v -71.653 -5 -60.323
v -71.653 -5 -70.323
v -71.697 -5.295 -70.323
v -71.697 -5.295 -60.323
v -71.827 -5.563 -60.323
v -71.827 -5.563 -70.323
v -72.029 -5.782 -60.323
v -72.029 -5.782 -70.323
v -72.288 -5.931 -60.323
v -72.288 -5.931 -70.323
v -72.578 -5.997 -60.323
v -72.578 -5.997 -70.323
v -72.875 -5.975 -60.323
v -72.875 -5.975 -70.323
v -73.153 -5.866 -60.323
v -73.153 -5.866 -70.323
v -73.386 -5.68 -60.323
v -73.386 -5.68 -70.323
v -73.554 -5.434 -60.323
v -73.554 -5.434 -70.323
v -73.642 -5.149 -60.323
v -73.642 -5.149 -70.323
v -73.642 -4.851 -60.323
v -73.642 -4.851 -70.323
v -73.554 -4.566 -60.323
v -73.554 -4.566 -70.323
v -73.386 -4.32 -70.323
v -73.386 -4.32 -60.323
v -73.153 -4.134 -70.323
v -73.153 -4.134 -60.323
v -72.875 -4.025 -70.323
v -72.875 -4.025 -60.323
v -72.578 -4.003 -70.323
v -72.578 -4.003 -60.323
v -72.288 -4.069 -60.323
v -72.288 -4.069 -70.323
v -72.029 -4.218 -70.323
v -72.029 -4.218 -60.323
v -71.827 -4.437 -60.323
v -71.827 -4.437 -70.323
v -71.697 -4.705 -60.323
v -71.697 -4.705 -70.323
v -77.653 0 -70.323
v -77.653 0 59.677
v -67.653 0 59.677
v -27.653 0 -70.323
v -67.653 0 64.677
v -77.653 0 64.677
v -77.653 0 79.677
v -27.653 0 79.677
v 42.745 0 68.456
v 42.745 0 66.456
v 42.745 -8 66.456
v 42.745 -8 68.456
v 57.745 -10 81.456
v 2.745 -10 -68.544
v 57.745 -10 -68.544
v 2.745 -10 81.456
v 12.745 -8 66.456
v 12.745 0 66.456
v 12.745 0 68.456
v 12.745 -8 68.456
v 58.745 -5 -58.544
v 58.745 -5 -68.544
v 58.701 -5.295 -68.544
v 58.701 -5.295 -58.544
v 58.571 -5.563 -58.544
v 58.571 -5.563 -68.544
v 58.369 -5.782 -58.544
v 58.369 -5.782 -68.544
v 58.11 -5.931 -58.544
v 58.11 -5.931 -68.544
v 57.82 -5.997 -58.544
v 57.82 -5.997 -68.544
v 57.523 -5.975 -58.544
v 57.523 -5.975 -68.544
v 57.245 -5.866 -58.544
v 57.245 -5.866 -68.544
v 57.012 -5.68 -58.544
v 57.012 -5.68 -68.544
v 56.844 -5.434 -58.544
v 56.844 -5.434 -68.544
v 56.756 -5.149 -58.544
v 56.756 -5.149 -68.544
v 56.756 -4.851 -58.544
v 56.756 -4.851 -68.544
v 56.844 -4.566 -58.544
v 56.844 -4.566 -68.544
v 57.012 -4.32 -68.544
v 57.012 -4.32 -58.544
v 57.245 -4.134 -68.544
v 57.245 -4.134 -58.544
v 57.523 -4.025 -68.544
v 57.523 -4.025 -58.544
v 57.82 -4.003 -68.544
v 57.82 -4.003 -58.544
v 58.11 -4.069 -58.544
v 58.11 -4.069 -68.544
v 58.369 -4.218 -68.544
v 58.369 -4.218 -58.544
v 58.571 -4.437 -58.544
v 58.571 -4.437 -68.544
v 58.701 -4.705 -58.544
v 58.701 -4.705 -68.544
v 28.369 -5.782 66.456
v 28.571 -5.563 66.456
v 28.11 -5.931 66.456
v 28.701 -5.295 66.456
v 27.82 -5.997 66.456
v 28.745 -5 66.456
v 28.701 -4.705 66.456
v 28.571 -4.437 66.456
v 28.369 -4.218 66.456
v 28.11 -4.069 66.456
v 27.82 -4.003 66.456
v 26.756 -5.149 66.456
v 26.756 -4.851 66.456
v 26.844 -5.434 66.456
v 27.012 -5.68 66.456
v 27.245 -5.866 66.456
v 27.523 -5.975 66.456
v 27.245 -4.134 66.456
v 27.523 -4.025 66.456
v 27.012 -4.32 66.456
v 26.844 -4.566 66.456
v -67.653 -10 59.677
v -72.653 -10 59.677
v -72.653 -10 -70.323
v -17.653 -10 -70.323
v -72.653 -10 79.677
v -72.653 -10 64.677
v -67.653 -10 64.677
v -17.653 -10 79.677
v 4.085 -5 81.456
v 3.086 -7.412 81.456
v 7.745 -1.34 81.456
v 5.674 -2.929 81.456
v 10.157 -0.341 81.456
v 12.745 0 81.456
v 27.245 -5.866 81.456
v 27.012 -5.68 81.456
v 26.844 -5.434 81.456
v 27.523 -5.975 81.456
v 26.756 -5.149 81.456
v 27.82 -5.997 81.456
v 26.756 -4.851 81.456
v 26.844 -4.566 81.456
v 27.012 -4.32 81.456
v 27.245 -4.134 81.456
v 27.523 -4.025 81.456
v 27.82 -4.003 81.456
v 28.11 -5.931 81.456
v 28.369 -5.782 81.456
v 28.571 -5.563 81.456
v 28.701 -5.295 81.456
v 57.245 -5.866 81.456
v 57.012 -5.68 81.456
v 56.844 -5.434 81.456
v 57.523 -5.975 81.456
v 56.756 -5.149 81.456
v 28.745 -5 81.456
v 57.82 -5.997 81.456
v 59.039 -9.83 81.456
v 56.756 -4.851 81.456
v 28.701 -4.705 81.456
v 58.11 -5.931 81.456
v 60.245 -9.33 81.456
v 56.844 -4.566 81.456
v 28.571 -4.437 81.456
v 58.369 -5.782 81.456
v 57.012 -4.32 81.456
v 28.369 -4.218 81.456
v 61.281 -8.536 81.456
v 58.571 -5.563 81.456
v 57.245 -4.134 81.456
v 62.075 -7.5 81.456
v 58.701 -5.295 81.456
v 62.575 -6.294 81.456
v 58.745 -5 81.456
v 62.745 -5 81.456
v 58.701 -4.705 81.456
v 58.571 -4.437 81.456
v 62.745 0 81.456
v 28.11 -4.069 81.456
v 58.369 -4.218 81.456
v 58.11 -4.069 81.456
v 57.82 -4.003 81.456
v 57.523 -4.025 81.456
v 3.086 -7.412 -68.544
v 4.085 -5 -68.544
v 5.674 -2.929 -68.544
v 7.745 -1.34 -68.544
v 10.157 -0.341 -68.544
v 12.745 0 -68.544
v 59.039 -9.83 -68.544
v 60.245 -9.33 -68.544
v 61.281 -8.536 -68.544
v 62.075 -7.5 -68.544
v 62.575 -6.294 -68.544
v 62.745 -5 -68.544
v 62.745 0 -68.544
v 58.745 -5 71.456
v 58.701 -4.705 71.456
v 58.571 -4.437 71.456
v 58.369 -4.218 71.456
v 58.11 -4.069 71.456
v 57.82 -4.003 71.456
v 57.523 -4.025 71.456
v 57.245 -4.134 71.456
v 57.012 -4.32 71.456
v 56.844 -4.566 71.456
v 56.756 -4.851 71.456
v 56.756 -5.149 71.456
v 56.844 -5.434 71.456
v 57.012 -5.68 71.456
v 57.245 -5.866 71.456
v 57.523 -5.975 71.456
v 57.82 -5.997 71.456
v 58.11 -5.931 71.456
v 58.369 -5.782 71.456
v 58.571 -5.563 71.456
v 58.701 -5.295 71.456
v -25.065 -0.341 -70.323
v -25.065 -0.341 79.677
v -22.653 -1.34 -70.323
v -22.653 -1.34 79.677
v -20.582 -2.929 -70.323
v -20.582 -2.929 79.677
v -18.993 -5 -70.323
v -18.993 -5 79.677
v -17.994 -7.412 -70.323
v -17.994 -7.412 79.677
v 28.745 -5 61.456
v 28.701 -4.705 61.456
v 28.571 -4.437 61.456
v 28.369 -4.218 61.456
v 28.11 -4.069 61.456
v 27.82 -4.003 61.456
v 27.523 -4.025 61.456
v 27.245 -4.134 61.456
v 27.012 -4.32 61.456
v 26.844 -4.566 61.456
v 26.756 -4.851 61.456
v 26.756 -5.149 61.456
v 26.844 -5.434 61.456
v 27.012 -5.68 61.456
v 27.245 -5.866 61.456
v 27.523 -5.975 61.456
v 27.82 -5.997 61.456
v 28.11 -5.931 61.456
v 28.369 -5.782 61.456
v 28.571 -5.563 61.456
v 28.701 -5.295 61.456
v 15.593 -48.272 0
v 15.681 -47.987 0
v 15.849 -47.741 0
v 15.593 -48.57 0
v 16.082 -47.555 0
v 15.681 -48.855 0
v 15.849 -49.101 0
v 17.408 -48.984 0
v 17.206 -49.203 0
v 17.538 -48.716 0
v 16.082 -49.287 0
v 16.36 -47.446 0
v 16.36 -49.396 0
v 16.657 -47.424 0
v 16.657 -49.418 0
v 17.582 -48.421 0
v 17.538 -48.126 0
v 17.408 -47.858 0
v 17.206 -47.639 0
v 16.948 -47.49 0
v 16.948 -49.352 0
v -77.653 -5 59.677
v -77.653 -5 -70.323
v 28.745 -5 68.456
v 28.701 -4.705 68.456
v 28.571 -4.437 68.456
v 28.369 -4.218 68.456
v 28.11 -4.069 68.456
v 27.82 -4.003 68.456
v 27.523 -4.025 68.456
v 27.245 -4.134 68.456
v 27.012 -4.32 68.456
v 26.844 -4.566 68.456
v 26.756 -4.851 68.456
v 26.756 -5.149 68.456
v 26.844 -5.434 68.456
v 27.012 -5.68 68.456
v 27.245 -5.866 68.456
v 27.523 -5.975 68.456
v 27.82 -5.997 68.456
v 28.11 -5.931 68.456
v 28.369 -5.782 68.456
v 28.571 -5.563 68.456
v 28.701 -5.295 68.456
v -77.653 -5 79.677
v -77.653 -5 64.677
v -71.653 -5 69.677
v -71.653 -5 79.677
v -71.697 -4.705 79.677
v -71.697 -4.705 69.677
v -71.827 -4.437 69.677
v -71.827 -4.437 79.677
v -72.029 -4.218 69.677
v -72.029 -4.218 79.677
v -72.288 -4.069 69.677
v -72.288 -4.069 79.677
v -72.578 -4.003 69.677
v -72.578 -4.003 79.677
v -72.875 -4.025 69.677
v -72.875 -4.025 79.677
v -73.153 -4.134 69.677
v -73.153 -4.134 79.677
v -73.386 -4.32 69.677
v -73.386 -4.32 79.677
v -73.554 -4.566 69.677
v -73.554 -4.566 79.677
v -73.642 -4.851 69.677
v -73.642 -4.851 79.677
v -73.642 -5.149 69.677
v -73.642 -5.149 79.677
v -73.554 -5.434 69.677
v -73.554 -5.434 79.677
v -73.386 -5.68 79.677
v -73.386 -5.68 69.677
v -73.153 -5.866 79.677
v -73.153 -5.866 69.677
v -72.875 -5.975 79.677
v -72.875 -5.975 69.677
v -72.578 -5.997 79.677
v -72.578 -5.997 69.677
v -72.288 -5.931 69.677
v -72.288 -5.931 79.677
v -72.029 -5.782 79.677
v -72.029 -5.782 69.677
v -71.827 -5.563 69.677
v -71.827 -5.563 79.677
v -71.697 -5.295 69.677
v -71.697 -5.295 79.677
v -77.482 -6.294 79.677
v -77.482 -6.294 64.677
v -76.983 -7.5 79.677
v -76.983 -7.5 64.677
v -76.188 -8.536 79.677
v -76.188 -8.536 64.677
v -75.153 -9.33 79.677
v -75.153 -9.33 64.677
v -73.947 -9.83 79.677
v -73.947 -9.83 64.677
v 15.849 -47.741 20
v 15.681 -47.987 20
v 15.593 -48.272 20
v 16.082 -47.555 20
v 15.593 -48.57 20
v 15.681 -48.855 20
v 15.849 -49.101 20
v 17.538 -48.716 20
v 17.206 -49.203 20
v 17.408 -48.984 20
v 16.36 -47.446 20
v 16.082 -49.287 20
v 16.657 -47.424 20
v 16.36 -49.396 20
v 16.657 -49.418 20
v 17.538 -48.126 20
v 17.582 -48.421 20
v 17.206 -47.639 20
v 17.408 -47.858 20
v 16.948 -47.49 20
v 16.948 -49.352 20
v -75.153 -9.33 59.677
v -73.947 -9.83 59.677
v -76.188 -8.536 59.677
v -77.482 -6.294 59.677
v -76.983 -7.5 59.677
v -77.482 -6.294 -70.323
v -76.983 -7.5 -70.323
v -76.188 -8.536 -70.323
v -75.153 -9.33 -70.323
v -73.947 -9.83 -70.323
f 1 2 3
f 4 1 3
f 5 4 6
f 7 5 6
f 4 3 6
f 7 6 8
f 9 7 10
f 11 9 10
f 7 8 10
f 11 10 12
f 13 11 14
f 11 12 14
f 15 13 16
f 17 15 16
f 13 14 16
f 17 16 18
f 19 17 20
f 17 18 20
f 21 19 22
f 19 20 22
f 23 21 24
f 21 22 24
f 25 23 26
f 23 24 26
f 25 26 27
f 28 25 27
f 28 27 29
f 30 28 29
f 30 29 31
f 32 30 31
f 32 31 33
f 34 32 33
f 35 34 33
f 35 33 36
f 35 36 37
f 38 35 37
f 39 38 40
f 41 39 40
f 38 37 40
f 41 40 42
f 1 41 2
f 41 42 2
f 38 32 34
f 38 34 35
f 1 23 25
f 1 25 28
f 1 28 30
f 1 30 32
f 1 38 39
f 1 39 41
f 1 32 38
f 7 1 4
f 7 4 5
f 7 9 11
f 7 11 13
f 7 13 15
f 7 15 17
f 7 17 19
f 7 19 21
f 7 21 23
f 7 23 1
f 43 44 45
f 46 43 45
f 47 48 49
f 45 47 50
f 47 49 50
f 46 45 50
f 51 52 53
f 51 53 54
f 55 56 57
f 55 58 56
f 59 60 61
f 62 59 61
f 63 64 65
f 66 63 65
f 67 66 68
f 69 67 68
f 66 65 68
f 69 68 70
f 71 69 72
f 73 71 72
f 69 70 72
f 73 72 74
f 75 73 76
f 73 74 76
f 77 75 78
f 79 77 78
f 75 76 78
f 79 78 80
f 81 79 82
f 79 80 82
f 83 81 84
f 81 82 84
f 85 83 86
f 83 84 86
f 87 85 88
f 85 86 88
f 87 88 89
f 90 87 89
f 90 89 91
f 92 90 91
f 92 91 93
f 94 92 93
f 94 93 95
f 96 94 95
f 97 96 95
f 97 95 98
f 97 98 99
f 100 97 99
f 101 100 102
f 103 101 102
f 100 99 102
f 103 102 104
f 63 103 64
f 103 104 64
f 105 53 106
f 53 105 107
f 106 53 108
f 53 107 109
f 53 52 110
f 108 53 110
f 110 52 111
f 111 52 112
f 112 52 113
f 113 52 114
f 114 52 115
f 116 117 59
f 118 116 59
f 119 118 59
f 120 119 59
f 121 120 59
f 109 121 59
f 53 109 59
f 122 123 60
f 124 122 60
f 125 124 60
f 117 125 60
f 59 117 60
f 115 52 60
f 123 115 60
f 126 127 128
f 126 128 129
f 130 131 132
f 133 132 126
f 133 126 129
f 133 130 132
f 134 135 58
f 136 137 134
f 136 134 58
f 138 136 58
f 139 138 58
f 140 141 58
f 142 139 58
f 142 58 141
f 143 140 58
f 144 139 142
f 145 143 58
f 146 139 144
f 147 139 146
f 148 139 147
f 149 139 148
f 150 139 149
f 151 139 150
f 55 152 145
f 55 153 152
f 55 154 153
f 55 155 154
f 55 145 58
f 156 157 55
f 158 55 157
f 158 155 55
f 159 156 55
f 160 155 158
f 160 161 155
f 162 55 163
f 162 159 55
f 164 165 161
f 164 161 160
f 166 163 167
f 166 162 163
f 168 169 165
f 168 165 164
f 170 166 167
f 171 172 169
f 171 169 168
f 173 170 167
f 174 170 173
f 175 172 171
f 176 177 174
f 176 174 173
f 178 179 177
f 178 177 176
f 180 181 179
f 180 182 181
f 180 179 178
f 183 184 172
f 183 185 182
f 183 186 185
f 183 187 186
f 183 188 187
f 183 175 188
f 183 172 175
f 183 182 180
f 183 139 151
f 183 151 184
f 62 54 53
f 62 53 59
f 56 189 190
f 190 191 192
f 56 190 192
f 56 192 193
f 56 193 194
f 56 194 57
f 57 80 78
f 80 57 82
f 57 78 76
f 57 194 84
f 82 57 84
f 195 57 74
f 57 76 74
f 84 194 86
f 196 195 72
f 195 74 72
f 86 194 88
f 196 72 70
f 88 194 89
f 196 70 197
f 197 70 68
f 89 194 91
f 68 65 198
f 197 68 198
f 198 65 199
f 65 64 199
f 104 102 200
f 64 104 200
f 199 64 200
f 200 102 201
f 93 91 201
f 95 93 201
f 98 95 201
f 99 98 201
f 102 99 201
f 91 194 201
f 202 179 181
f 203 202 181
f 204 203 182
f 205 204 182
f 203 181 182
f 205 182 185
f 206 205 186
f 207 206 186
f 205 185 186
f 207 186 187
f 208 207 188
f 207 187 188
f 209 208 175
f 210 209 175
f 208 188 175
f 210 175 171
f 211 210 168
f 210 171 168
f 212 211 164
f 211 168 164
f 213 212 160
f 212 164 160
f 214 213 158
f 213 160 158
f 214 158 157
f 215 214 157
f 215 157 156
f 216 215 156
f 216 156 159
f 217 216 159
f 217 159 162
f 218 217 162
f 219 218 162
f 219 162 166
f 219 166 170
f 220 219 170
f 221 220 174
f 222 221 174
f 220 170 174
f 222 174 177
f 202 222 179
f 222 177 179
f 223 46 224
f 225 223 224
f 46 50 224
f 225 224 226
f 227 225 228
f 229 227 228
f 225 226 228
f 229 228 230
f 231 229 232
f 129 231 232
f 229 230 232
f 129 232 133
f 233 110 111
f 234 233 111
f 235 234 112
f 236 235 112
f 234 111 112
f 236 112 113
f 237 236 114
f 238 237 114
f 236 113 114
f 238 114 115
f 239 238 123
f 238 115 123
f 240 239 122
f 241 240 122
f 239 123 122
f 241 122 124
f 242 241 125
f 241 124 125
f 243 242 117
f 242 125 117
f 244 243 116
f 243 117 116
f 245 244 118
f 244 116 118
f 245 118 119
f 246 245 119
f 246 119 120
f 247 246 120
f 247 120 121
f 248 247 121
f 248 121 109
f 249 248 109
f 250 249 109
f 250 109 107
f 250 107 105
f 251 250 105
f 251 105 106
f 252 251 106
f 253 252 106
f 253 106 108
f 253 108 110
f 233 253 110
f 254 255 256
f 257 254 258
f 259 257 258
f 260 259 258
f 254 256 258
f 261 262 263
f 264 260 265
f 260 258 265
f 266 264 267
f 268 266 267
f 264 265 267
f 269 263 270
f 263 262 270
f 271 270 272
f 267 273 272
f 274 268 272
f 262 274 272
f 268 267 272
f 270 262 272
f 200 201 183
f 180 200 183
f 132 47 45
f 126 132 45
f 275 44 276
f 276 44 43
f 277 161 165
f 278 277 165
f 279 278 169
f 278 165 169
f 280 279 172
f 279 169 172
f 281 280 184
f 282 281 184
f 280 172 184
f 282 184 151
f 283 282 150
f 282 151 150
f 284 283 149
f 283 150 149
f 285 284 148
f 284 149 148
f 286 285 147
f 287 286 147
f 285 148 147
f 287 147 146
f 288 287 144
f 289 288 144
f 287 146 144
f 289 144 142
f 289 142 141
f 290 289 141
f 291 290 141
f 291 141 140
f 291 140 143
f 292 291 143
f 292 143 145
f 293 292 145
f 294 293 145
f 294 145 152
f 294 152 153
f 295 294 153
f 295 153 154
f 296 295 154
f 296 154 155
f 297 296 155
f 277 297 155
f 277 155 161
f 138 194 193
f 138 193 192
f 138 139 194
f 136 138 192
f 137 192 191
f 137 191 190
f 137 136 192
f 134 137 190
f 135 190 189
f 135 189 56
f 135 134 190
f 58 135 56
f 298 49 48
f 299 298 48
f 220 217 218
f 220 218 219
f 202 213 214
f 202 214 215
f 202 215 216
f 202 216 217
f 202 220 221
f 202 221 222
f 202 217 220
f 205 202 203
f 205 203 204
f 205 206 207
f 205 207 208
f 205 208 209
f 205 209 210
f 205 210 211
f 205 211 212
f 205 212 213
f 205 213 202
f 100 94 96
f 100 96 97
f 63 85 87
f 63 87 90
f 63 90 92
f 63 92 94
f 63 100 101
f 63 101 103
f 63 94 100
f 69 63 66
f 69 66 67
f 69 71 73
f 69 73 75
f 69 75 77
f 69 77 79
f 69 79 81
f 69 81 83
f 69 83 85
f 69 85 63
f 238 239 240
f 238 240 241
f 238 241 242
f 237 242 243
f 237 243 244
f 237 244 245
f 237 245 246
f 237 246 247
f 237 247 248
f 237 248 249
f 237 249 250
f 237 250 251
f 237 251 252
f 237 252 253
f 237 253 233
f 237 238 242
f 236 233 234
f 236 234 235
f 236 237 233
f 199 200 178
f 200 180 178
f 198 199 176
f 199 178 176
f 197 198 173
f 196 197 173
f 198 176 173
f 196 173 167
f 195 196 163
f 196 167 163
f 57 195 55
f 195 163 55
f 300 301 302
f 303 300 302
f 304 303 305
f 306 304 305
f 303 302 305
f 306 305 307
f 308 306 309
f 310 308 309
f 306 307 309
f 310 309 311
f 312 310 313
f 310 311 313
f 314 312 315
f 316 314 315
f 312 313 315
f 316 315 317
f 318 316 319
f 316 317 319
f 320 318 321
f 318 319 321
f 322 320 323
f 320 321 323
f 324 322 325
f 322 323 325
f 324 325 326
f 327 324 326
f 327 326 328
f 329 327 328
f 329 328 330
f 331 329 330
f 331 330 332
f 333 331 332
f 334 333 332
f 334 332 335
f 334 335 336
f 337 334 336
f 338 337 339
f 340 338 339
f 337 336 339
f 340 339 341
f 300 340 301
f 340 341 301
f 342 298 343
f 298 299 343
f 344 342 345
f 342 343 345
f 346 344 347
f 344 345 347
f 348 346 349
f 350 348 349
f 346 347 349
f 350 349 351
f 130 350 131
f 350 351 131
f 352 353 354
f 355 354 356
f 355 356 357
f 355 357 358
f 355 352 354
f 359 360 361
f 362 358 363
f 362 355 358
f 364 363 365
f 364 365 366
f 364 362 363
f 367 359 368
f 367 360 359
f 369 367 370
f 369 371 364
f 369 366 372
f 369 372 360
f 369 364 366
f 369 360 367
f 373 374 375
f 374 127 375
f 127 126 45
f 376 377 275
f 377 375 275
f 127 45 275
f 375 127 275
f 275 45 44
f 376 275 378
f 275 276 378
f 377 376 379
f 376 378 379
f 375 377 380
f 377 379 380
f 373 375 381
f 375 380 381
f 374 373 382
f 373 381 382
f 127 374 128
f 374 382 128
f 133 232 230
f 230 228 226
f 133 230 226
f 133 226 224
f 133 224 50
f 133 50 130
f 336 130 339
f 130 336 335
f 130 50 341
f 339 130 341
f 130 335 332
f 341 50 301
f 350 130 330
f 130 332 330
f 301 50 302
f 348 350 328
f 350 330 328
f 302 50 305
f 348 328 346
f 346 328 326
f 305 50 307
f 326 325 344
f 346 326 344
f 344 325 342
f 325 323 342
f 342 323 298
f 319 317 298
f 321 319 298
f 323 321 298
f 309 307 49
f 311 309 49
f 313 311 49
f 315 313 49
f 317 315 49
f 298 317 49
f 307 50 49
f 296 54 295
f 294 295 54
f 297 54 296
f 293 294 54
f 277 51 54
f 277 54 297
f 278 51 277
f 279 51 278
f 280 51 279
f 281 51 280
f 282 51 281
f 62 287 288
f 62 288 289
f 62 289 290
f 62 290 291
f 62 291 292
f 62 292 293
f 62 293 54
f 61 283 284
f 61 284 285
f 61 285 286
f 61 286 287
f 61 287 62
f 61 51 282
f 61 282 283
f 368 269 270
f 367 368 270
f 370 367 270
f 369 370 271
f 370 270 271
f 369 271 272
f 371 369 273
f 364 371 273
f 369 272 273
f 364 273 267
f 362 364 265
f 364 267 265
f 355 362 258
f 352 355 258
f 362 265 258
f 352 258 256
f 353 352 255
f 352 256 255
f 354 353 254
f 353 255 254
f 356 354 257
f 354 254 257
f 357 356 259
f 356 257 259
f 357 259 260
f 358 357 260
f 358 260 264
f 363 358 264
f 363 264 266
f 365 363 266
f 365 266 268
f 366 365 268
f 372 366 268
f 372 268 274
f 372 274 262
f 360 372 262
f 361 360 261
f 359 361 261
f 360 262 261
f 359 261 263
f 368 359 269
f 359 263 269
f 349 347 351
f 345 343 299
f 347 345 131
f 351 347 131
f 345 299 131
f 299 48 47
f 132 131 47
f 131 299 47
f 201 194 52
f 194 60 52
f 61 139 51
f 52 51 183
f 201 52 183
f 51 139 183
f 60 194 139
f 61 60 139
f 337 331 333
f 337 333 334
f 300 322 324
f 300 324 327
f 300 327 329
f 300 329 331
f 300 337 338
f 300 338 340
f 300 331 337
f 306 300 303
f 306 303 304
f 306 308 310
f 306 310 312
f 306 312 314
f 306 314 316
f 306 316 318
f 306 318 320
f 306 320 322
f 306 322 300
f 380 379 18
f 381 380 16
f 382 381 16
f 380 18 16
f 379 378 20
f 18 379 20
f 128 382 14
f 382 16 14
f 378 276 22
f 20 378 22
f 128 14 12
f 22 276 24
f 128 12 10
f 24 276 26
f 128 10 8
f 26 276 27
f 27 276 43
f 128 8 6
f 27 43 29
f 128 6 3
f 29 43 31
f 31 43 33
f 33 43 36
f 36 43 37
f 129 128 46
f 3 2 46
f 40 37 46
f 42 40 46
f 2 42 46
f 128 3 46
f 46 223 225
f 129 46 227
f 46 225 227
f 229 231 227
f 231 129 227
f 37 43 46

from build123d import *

# Parameters (mm, degrees)
F1_DEPTH  = 10
F0_W      = 60
F0_H      = 150
F2_R      = 5
F2_2_R    = 5
F4_R      = 9.99999
F4_2_R    = 9.99999
F3_W      = 30
F3_H      = 2
F5_DEPTH  = 8
F6_R      = 1
F7_DEPTH  = 20
F8_R      = 1
F9_DEPTH  = 10
F10_R     = 1
F11_DEPTH = 10
F12_R     = 1
F13_DEPTH = 10
F14_R     = 1
F15_DEPTH = 10
F16_R     = 1
F17_DEPTH = 20


# Not quite as in the source:
# - a fillet or chamfer is up to 0.001 mm smaller than in the source, because OpenCascade refuses the exact size


with BuildPart() as f1:
    # F0 (on Front) → F1 (new body)
    with BuildSketch(Plane.XZ):
        Polygon((-17.6528605427, 79.6767238528), (-77.6528605427, 79.6767238528), (-77.6528605427, 64.6767238528), (-67.6528605427, 64.6767238528), (-67.6528605427, 59.6767238528), (-77.6528605427, 59.6767238528), (-77.6528605427, -70.3232761472), (-17.6528605427, -70.3232761472), align=None)
    extrude(amount=F1_DEPTH)

    # F2
    f2_edges = [f1.edges().sort_by_distance(p)[0] for p in [
        (-77.652861, -10, 72.176724),
        (-77.652861, -10, -5.323276),
    ]]
    fillet(f2_edges, radius=F2_R)

    # F4#2 (radius 10 in the source; OpenCascade refuses exactly that, so slightly less here)
    f4_2_edges = [f1.edges().sort_by_distance(p)[0] for p in [
        (-17.652861, 0, 4.676724),
    ]]
    fillet(f4_2_edges, radius=F4_2_R)

    # F8 (on face) → F9 (cut)
    with BuildSketch(Plane(origin=(0, 0, -70.3232761472), x_dir=(1, 0, 0), z_dir=(0, 0, -1))):
        with Locations((-72.6528605427, 5)):
            Circle(F8_R)
    extrude(amount=-F9_DEPTH, mode=Mode.SUBTRACT)

    # F12 (on face) → F13 (cut)
    with BuildSketch(Plane.XY.offset(79.6767238528)):
        with Locations((-72.6528605427, -5)):
            Circle(F12_R)
    extrude(amount=-F13_DEPTH, mode=Mode.SUBTRACT)


with BuildPart() as f1b:
    # F0 (on Front) → F1, piece 2 (new body)
    with BuildSketch(Plane.XZ):
        with Locations((32.7451354545, 6.4557090402)):
            Rectangle(F0_W, F0_H)
    extrude(amount=F1_DEPTH)

    # F2#2
    f2_2_edges = [f1b.edges().sort_by_distance(p)[0] for p in [
        (62.745135, -10, 6.455709),
    ]]
    fillet(f2_2_edges, radius=F2_2_R)

    # F4 (radius 10 in the source; OpenCascade refuses exactly that, so slightly less here)
    f4_edges = [f1b.edges().sort_by_distance(p)[0] for p in [
        (2.745135, 0, 6.455709),
    ]]
    fillet(f4_edges, radius=F4_R)

    # F3 (on face) → F5 (cut)
    with BuildSketch(Plane(origin=(0, 0, 0), x_dir=(-1, 0, 0), z_dir=(0, 1, 0))):
        with Locations((-27.7451354545, 67.4557090402)):
            Rectangle(F3_W, F3_H)
    extrude(amount=-F5_DEPTH, mode=Mode.SUBTRACT)

    # F6 (on face) → F7 (cut)
    with BuildSketch(Plane.XY.offset(81.4557090402)):
        with Locations((27.7451354545, -5)):
            Circle(F6_R)
    extrude(amount=-F7_DEPTH, mode=Mode.SUBTRACT)

    # F10 (on face) → F11 (cut)
    with BuildSketch(Plane(origin=(0, 0, -68.5442909598), x_dir=(1, 0, 0), z_dir=(0, 0, -1))):
        with Locations((57.7451354545, 5)):
            Circle(F10_R)
    extrude(amount=-F11_DEPTH, mode=Mode.SUBTRACT)

    # F14 (on face) → F15 (cut)
    with BuildSketch(Plane.XY.offset(81.4557090402)):
        with Locations((57.7451354545, -5)):
            Circle(F14_R)
    extrude(amount=-F15_DEPTH, mode=Mode.SUBTRACT)


with BuildPart() as f17:
    # F16 (on Top) → F17 (new body)
    with BuildSketch(Plane.XY):
        with Locations((16.5821891278, -48.4209731221)):
            Circle(F16_R)
    extrude(amount=F17_DEPTH)


solid = Compound([f1.part, f1b.part, f17.part])
